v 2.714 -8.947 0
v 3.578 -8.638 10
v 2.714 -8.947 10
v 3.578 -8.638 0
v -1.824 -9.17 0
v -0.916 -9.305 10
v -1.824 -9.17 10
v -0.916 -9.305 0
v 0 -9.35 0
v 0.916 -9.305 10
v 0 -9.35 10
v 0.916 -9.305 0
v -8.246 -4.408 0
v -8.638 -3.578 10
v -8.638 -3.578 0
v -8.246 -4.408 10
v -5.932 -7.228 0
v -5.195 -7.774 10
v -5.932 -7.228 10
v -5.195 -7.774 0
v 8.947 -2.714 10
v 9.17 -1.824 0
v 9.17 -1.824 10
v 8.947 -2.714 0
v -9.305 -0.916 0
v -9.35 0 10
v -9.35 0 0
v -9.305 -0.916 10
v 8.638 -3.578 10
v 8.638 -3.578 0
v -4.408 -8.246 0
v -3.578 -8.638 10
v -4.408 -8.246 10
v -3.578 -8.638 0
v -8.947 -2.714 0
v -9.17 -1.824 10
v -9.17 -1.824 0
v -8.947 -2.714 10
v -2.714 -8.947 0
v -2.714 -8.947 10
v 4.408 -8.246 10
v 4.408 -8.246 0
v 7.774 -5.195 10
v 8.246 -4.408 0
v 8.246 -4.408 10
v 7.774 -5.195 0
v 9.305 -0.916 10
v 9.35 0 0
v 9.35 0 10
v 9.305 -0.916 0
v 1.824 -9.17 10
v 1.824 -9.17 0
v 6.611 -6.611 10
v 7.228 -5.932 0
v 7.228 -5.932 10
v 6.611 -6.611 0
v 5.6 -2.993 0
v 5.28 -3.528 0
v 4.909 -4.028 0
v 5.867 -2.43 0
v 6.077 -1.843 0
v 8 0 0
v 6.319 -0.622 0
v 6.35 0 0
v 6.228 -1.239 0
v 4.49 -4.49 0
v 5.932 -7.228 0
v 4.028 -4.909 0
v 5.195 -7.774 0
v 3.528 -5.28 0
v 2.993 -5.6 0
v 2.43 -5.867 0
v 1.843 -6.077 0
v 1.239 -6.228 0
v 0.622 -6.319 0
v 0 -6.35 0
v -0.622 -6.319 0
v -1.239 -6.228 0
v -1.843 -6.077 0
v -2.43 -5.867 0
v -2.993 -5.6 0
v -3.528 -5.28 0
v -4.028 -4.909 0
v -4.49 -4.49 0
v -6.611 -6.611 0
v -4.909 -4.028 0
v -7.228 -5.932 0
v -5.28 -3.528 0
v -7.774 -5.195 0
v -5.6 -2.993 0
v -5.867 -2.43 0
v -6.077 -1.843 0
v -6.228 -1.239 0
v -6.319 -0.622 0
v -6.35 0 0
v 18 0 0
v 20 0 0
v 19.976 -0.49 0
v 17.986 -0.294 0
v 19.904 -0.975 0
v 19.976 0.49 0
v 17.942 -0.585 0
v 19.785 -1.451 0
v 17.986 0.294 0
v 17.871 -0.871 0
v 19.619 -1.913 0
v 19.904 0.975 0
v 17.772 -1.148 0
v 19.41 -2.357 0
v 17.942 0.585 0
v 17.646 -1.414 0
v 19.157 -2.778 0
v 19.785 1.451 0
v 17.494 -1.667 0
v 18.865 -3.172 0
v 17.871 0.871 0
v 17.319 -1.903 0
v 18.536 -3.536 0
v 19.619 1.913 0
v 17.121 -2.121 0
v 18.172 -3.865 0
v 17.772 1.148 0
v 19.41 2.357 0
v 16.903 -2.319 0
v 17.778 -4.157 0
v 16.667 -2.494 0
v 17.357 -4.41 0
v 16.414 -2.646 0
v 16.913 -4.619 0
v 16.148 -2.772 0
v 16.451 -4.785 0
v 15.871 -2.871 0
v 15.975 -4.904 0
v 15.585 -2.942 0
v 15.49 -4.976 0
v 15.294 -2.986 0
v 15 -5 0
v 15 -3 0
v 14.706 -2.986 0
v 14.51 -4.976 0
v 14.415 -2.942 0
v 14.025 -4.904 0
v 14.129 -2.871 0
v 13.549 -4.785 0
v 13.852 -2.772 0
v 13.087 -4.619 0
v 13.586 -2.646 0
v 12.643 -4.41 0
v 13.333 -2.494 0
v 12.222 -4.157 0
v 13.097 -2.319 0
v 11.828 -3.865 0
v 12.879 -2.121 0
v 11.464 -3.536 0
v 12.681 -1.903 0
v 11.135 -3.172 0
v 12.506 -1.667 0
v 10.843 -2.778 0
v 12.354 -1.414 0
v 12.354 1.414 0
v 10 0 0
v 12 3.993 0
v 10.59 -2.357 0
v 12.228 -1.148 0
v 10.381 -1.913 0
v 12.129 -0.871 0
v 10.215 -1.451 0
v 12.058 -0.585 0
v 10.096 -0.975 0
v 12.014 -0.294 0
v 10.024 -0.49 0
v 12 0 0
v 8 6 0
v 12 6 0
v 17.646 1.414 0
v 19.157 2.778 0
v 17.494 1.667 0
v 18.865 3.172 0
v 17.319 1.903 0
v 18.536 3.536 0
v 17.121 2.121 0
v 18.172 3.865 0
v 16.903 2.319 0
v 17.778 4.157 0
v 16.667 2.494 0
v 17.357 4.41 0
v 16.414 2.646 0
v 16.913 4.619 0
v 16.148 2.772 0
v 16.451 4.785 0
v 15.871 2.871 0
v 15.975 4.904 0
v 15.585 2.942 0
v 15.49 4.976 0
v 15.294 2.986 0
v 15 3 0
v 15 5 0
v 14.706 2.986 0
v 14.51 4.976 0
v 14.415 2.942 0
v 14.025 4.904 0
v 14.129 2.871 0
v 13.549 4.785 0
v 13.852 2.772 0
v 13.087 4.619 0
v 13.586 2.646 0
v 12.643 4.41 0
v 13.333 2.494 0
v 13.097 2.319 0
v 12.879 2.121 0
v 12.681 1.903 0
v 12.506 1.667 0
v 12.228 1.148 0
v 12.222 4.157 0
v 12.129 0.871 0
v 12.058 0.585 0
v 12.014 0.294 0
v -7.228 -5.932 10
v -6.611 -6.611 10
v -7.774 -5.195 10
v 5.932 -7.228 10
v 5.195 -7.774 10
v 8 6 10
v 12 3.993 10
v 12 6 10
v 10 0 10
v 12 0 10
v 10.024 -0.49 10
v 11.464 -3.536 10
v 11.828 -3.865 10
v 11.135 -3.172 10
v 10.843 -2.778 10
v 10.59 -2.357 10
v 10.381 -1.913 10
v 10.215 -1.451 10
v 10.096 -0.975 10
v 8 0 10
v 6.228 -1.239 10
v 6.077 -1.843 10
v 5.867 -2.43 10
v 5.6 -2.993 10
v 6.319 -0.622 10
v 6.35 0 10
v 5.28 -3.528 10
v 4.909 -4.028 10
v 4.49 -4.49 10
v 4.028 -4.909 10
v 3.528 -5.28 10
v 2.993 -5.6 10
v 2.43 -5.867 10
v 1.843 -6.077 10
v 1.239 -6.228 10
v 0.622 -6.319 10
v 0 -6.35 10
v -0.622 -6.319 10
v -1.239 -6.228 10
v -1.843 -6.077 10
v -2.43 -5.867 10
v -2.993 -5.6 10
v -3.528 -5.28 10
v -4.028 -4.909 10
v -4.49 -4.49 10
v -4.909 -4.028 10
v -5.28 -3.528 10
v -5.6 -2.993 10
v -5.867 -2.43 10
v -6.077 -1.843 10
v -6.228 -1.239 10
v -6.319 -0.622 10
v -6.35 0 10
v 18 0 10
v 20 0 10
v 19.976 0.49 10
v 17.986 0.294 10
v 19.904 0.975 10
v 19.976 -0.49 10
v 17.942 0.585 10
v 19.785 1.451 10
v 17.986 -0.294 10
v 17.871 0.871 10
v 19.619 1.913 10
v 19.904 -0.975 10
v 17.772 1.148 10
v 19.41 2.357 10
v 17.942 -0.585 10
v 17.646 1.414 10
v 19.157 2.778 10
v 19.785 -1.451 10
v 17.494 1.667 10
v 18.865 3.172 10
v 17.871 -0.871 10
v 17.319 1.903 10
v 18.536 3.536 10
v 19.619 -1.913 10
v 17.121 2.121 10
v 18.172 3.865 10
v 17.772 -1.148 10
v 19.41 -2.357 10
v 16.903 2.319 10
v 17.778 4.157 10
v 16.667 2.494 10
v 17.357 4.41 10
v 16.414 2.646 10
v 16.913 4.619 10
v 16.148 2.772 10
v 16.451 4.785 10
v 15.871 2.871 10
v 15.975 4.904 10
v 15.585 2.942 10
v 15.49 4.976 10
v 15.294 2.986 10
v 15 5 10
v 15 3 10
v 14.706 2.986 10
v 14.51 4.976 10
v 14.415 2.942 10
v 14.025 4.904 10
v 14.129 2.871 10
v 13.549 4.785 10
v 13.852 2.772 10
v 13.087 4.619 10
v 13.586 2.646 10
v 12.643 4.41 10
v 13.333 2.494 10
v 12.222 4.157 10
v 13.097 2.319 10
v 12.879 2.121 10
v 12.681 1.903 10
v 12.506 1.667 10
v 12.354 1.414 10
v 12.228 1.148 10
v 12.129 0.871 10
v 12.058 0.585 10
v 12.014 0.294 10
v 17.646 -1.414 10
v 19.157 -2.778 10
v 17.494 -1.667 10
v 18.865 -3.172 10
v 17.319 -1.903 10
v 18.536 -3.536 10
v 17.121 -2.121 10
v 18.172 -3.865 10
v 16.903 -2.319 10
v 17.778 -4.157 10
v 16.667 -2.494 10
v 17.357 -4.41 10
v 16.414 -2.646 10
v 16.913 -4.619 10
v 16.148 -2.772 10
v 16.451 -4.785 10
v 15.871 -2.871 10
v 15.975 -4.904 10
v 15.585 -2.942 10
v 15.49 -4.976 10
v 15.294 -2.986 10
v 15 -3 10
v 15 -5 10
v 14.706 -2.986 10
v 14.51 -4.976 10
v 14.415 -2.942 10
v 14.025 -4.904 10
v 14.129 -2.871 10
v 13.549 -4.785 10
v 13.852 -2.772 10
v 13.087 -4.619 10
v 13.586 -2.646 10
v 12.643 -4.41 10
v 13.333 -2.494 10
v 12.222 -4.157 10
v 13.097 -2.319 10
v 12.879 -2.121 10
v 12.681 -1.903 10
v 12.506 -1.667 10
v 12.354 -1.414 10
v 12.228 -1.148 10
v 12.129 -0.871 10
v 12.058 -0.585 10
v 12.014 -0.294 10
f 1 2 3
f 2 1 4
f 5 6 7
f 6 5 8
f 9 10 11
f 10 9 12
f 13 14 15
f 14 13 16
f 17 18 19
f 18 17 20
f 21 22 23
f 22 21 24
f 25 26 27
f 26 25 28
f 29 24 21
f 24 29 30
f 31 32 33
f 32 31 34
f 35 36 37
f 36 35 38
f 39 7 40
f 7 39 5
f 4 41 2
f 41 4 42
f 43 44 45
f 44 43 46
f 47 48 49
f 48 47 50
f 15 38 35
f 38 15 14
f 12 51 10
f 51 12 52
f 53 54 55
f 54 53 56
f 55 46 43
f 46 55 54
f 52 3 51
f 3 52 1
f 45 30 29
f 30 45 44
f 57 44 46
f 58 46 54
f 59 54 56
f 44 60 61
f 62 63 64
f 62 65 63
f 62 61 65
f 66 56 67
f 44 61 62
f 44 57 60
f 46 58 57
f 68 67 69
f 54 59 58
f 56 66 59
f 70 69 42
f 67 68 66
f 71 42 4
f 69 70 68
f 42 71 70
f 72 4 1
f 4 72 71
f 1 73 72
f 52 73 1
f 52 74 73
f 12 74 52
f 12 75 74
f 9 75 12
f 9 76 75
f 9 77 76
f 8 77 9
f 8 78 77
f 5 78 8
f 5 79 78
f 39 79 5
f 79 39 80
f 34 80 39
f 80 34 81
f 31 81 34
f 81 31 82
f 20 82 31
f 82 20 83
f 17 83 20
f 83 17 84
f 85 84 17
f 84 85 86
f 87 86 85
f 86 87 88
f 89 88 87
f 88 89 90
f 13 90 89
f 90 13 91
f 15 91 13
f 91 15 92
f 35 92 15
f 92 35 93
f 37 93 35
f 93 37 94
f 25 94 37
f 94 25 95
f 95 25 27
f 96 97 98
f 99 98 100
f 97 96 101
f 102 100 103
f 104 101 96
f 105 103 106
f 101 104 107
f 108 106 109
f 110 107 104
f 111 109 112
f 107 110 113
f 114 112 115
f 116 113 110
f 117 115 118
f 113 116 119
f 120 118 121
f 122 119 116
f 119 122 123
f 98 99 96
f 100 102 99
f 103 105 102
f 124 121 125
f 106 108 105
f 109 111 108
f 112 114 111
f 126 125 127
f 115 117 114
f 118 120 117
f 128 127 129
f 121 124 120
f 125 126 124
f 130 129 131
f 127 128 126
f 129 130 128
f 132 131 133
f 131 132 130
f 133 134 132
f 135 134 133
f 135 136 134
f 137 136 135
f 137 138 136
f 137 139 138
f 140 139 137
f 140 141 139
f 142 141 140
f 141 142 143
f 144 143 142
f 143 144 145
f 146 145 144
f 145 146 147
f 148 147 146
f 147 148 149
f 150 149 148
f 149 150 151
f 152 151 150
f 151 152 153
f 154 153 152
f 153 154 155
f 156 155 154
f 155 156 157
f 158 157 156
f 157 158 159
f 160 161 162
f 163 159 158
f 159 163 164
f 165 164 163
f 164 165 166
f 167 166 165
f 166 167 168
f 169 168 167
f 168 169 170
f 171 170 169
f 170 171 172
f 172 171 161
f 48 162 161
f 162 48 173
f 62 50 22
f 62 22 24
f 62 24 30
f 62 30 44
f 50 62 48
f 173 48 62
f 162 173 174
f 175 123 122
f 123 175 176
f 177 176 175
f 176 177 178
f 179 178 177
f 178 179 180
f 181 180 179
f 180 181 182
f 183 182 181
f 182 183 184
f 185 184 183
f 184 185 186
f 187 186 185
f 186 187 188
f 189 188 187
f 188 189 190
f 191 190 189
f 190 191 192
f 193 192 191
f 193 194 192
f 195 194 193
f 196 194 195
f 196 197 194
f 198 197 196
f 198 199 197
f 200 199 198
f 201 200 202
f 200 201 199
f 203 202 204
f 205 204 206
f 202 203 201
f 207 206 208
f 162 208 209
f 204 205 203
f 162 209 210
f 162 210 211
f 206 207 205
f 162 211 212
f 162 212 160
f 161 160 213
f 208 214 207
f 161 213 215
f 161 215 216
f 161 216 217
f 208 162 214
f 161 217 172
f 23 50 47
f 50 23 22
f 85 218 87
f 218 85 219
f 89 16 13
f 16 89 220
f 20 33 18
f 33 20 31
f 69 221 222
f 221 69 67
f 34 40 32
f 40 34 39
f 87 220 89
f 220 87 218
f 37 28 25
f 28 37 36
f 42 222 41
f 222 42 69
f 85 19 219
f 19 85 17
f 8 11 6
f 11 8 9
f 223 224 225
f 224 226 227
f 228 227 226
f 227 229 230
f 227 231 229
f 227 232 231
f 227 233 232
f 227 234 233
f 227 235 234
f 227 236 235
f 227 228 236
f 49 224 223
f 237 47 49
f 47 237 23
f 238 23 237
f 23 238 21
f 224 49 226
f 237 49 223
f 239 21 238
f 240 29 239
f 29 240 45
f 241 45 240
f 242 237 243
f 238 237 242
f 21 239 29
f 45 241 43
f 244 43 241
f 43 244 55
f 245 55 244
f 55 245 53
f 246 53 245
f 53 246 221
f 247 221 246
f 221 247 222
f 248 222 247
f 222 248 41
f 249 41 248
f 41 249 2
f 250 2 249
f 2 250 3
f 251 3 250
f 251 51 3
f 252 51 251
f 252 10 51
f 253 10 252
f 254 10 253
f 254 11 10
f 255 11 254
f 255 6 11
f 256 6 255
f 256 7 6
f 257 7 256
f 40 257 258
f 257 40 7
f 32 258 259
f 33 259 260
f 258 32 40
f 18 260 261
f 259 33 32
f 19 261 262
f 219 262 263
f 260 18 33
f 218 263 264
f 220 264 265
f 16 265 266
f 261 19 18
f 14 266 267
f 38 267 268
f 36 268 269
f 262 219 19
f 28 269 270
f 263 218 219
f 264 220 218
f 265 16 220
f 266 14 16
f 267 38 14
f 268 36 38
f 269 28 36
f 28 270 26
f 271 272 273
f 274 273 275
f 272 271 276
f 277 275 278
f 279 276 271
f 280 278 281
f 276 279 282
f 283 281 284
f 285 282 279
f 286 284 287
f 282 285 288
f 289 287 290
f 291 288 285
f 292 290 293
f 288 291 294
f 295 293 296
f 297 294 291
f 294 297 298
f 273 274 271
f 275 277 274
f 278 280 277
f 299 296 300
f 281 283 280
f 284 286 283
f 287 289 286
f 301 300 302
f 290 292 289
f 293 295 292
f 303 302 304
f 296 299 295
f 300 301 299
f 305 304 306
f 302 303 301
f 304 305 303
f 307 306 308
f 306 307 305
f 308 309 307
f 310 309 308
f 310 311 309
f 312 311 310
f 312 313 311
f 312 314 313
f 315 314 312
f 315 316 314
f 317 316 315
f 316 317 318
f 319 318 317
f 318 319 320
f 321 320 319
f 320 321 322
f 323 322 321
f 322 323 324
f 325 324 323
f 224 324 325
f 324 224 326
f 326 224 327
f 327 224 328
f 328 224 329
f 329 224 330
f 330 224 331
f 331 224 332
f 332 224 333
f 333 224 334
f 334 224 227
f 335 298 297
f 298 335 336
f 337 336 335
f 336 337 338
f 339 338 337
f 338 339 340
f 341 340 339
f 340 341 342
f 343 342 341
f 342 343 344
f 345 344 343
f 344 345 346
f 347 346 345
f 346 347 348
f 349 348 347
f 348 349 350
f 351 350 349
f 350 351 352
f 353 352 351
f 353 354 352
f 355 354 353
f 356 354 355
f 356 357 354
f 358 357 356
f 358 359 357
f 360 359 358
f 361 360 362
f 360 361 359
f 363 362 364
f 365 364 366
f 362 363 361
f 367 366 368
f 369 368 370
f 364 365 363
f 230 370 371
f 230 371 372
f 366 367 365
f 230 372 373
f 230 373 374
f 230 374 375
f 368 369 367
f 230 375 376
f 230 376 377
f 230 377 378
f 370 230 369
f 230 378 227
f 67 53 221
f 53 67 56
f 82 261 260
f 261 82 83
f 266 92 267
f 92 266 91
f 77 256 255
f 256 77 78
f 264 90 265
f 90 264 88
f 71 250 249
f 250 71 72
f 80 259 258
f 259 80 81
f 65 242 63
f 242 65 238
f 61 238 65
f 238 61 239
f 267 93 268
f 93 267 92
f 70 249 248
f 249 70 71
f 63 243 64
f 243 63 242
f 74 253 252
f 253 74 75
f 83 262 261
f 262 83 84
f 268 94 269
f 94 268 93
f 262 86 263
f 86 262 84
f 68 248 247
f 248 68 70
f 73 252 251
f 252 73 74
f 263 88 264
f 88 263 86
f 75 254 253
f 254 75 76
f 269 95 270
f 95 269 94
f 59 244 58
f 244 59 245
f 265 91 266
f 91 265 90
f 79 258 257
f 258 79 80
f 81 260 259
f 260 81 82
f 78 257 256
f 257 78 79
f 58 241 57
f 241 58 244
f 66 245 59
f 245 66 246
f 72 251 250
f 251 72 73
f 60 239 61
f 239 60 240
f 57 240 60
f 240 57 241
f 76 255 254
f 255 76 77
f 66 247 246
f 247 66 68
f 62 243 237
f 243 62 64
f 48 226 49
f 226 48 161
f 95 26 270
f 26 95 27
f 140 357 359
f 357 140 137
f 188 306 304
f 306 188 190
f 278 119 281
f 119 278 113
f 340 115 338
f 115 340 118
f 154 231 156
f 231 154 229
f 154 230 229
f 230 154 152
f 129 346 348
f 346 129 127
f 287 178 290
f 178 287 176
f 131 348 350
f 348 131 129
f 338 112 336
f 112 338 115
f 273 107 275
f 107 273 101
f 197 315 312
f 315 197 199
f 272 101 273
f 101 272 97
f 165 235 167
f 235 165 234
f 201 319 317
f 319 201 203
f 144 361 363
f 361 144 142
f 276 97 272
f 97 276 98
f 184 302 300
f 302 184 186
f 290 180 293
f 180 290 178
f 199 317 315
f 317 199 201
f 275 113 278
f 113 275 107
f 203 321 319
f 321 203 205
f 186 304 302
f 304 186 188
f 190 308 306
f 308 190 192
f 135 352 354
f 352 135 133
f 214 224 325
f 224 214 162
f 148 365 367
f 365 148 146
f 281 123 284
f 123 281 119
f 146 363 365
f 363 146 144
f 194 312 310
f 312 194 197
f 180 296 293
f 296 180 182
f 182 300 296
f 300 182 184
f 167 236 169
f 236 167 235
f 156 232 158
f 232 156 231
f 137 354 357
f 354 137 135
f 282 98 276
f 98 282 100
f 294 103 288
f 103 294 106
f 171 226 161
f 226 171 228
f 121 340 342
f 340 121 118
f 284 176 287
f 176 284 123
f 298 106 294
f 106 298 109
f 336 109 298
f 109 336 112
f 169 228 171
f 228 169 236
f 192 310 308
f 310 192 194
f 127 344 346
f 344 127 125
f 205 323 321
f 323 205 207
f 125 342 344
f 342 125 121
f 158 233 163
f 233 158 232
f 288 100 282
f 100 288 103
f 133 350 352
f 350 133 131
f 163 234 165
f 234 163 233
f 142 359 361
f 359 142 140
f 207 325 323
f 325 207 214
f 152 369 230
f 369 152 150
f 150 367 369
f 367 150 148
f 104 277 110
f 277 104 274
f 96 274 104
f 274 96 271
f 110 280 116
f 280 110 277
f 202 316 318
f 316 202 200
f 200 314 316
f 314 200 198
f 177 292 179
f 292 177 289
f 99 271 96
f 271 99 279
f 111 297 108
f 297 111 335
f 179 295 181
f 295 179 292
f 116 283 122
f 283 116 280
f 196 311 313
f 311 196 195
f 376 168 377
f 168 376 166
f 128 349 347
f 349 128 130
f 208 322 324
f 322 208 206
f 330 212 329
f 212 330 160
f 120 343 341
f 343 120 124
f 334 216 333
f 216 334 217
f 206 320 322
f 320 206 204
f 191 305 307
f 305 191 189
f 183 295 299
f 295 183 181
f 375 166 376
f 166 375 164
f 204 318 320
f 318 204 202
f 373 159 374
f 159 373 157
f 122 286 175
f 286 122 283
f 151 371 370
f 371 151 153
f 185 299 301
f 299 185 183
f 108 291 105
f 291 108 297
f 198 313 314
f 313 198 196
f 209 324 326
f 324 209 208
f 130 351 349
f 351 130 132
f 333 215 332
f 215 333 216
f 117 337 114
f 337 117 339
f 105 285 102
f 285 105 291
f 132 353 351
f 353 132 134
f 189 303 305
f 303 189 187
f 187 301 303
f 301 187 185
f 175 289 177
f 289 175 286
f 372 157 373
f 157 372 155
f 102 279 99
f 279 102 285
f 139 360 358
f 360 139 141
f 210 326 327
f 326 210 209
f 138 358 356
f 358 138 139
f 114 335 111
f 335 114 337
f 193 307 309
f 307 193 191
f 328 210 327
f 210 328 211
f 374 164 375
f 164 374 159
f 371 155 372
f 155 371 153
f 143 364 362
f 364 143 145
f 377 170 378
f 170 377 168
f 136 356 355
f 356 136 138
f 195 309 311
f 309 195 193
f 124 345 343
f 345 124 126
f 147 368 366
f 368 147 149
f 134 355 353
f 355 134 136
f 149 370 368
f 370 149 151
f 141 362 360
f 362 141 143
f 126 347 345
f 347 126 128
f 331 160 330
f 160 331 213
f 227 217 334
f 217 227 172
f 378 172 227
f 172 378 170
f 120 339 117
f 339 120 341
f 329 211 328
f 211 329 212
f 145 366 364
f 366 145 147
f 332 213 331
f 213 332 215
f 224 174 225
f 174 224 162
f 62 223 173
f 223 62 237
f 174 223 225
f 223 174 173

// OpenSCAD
// --- Dimensions ---
// Rod ring inner diameter
rod_id = 12.7;
// Rod ring wall thickness
rod_wall = 3;
// Rod ring outer diameter
rod_od = rod_id + 2 * rod_wall; // 18.7

// Rod ring opening width (Y direction)
rod_opening_y = 10;
// Rod ring opening extent in X (from -X side)
rod_opening_x = 5; // Remove everything with x < 0 and -5 < y < 5

// Tubing ring inner diameter
tube_id = 6;
// Tubing ring wall thickness
tube_wall = 2;
// Tubing ring outer diameter
tube_od = tube_id + 2 * tube_wall; // 10

// Tubing ring center position
tube_cx = 15;
tube_cy = 0;

// Tubing ring opening width (Y direction)
tube_opening_y = 4.5;
// Tubing ring opening extent in X (from +X side)
tube_opening_x = 2.25; // Remove everything with x > 15 and -2.25 < y < 2.25

// Bridge width (Y direction)
bridge_y = 6;
// Bridge X extent
bridge_x_start = 8;
bridge_x_end = 12;

// Extrusion height (Z)
height = 10;

// --- Model ---
$fn = 64;

module rod_ring() {
    difference() {
        // Outer cylinder
        cylinder(h = height, d = rod_od, center = false);
        // Inner cylinder (hole)
        cylinder(h = height + 0.1, d = rod_id, center = false);
        // Opening cutout: remove x < 0, -5 < y < 5
        translate([-rod_od/2 - 0.1, 0, 0])
            cube([rod_od + 0.2, rod_opening_y + 0.1, height + 0.1], center = false);
    }
}

module tubing_ring() {
    difference() {
        // Outer cylinder
        translate([tube_cx, tube_cy, 0])
            cylinder(h = height, d = tube_od, center = false);
        // Inner cylinder (hole)
        translate([tube_cx, tube_cy, 0])
            cylinder(h = height + 0.1, d = tube_id, center = false);
        // Opening cutout: remove x > 15, -2.25 < y < 2.25
        translate([tube_cx + tube_od/2 + 0.1, 0, 0])
            cube([tube_od + 0.2, tube_opening_y + 0.1, height + 0.1], center = false);
    }
}

module bridge() {
    translate([bridge_x_start, 0, 0])
        cube([bridge_x_end - bridge_x_start, bridge_y, height], center = false);
}

// Combine all parts
union() {
    rod_ring();
    tubing_ring();
    bridge();
}
